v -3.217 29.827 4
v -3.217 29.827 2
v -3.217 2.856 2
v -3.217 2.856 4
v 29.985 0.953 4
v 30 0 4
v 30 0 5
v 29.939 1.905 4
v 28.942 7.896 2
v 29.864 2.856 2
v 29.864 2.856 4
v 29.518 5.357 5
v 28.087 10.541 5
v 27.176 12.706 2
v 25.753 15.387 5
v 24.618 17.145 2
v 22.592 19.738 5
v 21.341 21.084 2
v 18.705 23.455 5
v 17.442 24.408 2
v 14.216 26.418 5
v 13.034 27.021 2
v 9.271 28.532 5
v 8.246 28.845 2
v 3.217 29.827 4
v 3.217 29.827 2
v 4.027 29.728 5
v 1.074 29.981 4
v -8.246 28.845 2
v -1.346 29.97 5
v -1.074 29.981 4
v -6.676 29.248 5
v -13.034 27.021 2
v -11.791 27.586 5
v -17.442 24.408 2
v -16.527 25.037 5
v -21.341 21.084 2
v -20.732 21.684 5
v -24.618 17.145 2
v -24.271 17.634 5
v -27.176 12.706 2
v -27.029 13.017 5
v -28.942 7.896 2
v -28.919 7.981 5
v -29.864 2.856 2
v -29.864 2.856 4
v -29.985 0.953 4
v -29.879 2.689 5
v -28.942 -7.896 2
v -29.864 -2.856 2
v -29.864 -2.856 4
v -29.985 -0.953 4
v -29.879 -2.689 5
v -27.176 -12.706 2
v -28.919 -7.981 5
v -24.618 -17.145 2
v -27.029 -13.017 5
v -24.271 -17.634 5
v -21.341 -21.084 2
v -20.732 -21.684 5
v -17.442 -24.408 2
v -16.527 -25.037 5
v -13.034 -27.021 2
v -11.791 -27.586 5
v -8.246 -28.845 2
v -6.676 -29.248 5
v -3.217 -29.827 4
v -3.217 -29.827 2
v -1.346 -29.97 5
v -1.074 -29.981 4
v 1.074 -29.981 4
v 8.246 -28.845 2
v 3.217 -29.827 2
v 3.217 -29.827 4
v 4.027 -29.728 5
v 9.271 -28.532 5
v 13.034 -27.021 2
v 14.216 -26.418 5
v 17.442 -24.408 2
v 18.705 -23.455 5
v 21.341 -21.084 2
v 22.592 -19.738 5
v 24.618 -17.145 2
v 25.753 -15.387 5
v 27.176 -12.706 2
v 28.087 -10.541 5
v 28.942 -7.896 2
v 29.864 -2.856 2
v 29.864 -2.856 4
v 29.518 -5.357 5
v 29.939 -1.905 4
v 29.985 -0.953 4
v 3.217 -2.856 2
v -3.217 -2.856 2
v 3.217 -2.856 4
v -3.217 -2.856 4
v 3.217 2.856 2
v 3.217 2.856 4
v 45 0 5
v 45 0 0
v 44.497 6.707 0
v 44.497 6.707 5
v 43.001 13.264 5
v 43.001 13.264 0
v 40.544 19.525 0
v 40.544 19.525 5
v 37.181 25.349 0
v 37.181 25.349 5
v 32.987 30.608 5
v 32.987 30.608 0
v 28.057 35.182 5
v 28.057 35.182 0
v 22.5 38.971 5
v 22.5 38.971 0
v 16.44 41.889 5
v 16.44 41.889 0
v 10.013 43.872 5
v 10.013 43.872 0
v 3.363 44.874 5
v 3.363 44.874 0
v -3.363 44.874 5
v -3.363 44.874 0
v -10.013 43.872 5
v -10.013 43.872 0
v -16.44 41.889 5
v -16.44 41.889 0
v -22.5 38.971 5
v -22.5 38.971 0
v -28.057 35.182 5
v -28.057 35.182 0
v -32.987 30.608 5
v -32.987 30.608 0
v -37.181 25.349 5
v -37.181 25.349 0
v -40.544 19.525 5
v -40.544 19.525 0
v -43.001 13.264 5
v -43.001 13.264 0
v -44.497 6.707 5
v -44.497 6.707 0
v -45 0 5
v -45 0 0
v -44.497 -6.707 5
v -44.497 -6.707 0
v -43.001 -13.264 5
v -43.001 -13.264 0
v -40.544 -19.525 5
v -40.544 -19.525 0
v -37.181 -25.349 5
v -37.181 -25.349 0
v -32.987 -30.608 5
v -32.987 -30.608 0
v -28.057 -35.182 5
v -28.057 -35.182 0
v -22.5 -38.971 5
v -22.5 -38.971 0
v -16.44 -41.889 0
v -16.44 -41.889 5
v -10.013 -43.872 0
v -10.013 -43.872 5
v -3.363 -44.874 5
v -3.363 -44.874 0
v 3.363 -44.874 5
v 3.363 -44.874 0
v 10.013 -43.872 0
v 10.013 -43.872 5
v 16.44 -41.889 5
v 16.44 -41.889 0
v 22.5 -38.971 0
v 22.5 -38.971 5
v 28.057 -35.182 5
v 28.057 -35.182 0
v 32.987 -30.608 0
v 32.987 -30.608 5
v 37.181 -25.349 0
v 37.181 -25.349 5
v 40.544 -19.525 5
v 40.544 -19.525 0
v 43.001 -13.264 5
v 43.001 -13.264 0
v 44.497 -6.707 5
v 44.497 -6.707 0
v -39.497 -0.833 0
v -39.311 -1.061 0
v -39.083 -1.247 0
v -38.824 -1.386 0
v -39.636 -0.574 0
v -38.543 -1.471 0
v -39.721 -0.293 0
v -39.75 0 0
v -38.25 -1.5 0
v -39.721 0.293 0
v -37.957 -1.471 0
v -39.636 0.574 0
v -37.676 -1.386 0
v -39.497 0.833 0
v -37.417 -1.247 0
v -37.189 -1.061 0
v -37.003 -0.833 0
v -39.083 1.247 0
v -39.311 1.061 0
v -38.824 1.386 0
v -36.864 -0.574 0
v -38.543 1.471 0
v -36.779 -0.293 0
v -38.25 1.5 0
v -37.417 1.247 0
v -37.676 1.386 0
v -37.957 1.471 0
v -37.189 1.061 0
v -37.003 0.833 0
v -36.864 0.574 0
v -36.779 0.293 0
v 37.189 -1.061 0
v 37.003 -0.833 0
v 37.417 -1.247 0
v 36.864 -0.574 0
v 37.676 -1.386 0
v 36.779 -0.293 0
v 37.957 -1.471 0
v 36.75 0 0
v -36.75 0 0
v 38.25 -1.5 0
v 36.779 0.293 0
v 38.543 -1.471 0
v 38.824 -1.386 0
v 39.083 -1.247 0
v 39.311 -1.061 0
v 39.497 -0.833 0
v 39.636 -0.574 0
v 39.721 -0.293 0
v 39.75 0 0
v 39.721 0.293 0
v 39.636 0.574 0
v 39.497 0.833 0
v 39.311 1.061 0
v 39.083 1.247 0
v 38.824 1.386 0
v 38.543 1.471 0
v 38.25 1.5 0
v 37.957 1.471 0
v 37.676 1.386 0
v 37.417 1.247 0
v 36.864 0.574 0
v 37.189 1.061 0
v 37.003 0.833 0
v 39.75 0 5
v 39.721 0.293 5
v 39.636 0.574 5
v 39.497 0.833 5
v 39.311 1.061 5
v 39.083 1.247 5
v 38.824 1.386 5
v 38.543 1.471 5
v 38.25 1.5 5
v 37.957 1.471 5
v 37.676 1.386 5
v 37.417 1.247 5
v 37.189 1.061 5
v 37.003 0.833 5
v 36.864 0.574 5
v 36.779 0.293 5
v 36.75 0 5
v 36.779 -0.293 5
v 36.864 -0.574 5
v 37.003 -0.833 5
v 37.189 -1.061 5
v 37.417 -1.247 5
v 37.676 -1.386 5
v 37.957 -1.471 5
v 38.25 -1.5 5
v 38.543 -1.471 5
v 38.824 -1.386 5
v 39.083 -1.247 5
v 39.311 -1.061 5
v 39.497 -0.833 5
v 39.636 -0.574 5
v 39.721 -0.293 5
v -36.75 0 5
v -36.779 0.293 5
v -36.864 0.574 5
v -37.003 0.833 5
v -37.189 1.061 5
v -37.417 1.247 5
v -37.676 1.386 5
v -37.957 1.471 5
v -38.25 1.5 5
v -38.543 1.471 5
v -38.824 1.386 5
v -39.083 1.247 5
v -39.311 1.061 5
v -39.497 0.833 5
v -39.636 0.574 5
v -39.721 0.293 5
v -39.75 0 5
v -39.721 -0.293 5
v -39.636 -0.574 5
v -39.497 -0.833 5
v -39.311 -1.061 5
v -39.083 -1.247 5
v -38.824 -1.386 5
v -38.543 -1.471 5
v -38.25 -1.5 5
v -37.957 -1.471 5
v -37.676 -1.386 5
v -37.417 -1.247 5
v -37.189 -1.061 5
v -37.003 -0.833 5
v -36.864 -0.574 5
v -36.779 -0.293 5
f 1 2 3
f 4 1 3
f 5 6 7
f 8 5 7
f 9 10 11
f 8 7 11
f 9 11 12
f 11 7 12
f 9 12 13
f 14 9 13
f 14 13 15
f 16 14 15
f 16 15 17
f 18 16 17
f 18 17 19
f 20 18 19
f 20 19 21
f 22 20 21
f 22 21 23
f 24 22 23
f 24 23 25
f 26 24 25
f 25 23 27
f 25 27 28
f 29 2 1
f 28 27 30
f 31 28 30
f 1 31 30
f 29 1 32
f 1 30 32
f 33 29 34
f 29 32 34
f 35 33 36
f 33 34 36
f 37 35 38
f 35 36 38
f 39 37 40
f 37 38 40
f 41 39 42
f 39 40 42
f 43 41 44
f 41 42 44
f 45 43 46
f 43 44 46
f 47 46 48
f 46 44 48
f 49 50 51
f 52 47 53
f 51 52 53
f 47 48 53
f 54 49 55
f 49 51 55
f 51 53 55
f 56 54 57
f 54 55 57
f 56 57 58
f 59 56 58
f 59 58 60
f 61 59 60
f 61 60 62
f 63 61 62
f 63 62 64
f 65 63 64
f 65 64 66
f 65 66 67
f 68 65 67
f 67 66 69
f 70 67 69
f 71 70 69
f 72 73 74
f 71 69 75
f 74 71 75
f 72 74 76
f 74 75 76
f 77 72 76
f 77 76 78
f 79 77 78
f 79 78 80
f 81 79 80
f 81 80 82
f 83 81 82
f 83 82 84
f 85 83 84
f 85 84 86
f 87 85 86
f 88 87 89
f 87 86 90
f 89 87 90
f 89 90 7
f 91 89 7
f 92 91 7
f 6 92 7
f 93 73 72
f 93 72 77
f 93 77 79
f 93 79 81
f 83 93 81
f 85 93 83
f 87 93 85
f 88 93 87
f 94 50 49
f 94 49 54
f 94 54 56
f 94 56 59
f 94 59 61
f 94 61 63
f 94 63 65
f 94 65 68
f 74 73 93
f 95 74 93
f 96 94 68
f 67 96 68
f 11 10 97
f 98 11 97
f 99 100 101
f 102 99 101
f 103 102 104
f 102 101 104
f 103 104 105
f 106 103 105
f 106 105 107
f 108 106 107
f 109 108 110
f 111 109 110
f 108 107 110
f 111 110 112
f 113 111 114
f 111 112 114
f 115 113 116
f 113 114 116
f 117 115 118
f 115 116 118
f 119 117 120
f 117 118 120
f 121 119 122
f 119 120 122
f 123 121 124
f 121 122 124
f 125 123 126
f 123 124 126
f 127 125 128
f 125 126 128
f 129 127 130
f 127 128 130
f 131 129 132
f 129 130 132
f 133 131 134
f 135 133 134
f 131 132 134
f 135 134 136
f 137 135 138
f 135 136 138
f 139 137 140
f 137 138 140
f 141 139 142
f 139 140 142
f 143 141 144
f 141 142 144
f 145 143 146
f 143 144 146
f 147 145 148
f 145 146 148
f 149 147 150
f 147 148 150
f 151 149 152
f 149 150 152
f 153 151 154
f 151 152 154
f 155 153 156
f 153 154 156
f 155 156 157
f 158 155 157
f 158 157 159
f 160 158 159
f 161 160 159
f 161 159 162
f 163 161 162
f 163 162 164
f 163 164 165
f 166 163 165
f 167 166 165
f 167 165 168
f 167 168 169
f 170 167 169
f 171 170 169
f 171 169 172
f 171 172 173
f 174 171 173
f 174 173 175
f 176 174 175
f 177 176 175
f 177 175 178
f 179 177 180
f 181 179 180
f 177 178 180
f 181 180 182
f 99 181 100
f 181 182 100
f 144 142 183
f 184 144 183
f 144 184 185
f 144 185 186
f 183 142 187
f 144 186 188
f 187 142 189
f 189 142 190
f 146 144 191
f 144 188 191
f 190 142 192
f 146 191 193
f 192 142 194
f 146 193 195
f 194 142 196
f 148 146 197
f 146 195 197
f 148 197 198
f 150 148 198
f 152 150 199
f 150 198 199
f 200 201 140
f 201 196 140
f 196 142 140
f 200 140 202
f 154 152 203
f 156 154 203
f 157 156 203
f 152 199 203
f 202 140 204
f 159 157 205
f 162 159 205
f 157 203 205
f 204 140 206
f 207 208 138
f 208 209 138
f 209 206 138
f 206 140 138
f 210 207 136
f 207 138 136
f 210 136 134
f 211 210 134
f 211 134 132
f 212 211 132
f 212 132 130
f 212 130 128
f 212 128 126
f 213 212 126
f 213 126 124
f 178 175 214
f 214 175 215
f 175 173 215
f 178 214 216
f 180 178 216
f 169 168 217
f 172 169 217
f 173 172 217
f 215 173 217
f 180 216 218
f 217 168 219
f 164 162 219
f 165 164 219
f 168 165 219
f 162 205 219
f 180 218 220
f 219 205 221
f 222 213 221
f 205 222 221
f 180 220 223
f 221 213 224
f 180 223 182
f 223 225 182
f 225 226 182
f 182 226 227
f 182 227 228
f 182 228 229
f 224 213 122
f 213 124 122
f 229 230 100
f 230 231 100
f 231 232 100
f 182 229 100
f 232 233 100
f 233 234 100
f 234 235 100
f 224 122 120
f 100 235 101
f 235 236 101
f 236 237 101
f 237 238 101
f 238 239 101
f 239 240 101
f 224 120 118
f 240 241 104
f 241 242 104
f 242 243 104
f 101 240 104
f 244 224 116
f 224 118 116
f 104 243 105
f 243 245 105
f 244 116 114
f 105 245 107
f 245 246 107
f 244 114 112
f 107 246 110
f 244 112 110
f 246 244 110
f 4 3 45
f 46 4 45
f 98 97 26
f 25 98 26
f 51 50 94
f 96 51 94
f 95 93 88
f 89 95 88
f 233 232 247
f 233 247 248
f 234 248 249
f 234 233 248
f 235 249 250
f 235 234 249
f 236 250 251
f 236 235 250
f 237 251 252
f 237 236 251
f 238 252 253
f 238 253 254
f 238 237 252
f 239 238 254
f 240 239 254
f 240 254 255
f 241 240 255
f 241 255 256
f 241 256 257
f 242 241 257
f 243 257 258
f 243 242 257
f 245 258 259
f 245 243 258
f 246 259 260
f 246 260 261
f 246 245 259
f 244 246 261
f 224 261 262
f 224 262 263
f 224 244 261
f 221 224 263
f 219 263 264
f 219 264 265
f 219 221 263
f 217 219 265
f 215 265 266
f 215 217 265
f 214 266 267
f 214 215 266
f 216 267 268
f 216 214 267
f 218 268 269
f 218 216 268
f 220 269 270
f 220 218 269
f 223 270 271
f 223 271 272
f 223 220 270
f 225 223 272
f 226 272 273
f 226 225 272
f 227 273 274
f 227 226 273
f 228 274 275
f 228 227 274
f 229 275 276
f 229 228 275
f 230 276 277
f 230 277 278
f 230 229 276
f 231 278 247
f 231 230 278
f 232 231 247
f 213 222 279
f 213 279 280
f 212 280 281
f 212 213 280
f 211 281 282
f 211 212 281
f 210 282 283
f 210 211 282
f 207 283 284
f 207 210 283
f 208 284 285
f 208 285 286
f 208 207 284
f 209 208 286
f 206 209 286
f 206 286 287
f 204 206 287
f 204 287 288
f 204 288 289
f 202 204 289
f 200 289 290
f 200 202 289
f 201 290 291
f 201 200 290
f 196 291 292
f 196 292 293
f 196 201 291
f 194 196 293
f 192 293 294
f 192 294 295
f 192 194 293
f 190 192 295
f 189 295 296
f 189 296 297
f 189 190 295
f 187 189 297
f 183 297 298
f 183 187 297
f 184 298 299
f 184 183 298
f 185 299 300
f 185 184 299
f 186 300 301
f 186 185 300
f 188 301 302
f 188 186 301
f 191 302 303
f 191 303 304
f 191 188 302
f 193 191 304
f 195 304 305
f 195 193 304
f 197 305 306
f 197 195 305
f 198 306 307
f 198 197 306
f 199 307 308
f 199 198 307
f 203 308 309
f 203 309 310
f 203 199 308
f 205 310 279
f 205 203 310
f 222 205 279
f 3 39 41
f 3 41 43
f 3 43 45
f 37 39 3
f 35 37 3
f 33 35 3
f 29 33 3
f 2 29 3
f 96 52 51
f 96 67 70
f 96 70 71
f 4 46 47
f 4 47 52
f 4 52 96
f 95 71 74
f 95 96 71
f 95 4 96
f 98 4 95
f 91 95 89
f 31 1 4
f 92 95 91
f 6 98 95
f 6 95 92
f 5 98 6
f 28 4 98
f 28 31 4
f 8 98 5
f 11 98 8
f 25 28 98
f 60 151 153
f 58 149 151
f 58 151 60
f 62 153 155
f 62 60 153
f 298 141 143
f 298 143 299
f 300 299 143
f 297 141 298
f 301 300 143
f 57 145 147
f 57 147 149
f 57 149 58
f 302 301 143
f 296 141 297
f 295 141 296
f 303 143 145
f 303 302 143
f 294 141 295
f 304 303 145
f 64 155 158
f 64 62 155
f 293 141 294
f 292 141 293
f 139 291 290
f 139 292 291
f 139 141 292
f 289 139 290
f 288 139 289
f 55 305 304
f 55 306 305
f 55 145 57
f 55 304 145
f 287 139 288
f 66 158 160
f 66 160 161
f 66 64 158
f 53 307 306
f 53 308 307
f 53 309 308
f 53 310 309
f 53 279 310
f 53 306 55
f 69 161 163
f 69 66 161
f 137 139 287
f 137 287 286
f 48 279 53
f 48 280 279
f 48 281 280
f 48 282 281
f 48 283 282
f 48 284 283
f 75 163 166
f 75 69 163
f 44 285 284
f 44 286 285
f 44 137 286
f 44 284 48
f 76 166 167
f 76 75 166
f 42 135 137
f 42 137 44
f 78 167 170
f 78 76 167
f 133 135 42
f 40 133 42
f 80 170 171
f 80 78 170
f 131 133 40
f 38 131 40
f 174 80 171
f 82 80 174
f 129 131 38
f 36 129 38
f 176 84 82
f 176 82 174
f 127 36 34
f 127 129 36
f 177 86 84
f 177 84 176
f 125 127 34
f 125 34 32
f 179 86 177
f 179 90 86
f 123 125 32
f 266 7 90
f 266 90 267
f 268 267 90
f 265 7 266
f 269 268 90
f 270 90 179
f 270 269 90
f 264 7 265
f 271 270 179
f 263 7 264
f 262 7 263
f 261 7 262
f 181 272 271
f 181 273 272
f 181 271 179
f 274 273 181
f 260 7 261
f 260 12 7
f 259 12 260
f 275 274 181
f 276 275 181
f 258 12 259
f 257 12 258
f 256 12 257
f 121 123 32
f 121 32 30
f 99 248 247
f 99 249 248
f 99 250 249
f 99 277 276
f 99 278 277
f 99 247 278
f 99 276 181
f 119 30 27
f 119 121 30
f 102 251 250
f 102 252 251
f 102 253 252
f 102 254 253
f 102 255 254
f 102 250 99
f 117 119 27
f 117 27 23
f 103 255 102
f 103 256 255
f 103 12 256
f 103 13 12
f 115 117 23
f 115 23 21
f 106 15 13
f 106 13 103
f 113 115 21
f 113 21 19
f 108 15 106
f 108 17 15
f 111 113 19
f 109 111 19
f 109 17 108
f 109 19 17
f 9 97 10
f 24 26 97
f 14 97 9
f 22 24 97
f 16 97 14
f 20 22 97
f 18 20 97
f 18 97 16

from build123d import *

# Parameters (mm, degrees)
F0_R     = 45
F0_R_2   = 1.5
F1_DEPTH = 5
F2_R     = 30
F3_DEPTH = 3
F5_DEPTH = 2


with BuildPart() as f1:
    # F0 (on Top) → F1 (new body)
    with BuildSketch(Plane.XY):
        Circle(F0_R)
        with Locations((-38.25, 0)):
            Circle(F0_R_2, mode=Mode.SUBTRACT)
        with Locations((38.25, 0)):
            Circle(F0_R_2, mode=Mode.SUBTRACT)
    extrude(amount=F1_DEPTH)

    # F2 (on face) → F3 (cut)
    with BuildSketch(Plane.XY.offset(5)):
        Circle(F2_R)
    extrude(amount=-F3_DEPTH, mode=Mode.SUBTRACT)

    # F4 (on face) → F5 (join)
    with BuildSketch(Plane.XY.offset(2)):
        with BuildLine():
            Line((-3.2170990016, 29.8270057836), (-3.2170990016, 2.8556571342))
            Line((-3.2170990016, 2.8556571342), (-29.8637777639, 2.8556571342))
            ThreePointArc((-29.8637777639, 2.8556571342), (-30, 0), (-29.8637777639, -2.8556571342))
            Line((-29.8637777639, -2.8556571342), (-3.2170990016, -2.8556571342))
            Line((-3.2170990016, -2.8556571342), (-3.2170990016, -29.8270057836))
            ThreePointArc((-3.2170990016, -29.8270057836), (0, -30), (3.2170990016, -29.8270057836))
            Line((3.2170990016, -29.8270057836), (3.2170990016, -2.8556571342))
            Line((3.2170990016, -2.8556571342), (29.8637777639, -2.8556571342))
            ThreePointArc((29.8637777639, -2.8556571342), (29.9659250893, -1.4294521823), (30, 0))
            ThreePointArc((30, 0), (29.9659250893, 1.4294521823), (29.8637777639, 2.8556571342))
            Line((29.8637777639, 2.8556571342), (3.2170990016, 2.8556571342))
            Line((3.2170990016, 2.8556571342), (3.2170990016, 29.8270057836))
            ThreePointArc((3.2170990016, 29.8270057836), (0, 30), (-3.2170990016, 29.8270057836))
        make_face()
    extrude(amount=F5_DEPTH)


solid = f1.part
